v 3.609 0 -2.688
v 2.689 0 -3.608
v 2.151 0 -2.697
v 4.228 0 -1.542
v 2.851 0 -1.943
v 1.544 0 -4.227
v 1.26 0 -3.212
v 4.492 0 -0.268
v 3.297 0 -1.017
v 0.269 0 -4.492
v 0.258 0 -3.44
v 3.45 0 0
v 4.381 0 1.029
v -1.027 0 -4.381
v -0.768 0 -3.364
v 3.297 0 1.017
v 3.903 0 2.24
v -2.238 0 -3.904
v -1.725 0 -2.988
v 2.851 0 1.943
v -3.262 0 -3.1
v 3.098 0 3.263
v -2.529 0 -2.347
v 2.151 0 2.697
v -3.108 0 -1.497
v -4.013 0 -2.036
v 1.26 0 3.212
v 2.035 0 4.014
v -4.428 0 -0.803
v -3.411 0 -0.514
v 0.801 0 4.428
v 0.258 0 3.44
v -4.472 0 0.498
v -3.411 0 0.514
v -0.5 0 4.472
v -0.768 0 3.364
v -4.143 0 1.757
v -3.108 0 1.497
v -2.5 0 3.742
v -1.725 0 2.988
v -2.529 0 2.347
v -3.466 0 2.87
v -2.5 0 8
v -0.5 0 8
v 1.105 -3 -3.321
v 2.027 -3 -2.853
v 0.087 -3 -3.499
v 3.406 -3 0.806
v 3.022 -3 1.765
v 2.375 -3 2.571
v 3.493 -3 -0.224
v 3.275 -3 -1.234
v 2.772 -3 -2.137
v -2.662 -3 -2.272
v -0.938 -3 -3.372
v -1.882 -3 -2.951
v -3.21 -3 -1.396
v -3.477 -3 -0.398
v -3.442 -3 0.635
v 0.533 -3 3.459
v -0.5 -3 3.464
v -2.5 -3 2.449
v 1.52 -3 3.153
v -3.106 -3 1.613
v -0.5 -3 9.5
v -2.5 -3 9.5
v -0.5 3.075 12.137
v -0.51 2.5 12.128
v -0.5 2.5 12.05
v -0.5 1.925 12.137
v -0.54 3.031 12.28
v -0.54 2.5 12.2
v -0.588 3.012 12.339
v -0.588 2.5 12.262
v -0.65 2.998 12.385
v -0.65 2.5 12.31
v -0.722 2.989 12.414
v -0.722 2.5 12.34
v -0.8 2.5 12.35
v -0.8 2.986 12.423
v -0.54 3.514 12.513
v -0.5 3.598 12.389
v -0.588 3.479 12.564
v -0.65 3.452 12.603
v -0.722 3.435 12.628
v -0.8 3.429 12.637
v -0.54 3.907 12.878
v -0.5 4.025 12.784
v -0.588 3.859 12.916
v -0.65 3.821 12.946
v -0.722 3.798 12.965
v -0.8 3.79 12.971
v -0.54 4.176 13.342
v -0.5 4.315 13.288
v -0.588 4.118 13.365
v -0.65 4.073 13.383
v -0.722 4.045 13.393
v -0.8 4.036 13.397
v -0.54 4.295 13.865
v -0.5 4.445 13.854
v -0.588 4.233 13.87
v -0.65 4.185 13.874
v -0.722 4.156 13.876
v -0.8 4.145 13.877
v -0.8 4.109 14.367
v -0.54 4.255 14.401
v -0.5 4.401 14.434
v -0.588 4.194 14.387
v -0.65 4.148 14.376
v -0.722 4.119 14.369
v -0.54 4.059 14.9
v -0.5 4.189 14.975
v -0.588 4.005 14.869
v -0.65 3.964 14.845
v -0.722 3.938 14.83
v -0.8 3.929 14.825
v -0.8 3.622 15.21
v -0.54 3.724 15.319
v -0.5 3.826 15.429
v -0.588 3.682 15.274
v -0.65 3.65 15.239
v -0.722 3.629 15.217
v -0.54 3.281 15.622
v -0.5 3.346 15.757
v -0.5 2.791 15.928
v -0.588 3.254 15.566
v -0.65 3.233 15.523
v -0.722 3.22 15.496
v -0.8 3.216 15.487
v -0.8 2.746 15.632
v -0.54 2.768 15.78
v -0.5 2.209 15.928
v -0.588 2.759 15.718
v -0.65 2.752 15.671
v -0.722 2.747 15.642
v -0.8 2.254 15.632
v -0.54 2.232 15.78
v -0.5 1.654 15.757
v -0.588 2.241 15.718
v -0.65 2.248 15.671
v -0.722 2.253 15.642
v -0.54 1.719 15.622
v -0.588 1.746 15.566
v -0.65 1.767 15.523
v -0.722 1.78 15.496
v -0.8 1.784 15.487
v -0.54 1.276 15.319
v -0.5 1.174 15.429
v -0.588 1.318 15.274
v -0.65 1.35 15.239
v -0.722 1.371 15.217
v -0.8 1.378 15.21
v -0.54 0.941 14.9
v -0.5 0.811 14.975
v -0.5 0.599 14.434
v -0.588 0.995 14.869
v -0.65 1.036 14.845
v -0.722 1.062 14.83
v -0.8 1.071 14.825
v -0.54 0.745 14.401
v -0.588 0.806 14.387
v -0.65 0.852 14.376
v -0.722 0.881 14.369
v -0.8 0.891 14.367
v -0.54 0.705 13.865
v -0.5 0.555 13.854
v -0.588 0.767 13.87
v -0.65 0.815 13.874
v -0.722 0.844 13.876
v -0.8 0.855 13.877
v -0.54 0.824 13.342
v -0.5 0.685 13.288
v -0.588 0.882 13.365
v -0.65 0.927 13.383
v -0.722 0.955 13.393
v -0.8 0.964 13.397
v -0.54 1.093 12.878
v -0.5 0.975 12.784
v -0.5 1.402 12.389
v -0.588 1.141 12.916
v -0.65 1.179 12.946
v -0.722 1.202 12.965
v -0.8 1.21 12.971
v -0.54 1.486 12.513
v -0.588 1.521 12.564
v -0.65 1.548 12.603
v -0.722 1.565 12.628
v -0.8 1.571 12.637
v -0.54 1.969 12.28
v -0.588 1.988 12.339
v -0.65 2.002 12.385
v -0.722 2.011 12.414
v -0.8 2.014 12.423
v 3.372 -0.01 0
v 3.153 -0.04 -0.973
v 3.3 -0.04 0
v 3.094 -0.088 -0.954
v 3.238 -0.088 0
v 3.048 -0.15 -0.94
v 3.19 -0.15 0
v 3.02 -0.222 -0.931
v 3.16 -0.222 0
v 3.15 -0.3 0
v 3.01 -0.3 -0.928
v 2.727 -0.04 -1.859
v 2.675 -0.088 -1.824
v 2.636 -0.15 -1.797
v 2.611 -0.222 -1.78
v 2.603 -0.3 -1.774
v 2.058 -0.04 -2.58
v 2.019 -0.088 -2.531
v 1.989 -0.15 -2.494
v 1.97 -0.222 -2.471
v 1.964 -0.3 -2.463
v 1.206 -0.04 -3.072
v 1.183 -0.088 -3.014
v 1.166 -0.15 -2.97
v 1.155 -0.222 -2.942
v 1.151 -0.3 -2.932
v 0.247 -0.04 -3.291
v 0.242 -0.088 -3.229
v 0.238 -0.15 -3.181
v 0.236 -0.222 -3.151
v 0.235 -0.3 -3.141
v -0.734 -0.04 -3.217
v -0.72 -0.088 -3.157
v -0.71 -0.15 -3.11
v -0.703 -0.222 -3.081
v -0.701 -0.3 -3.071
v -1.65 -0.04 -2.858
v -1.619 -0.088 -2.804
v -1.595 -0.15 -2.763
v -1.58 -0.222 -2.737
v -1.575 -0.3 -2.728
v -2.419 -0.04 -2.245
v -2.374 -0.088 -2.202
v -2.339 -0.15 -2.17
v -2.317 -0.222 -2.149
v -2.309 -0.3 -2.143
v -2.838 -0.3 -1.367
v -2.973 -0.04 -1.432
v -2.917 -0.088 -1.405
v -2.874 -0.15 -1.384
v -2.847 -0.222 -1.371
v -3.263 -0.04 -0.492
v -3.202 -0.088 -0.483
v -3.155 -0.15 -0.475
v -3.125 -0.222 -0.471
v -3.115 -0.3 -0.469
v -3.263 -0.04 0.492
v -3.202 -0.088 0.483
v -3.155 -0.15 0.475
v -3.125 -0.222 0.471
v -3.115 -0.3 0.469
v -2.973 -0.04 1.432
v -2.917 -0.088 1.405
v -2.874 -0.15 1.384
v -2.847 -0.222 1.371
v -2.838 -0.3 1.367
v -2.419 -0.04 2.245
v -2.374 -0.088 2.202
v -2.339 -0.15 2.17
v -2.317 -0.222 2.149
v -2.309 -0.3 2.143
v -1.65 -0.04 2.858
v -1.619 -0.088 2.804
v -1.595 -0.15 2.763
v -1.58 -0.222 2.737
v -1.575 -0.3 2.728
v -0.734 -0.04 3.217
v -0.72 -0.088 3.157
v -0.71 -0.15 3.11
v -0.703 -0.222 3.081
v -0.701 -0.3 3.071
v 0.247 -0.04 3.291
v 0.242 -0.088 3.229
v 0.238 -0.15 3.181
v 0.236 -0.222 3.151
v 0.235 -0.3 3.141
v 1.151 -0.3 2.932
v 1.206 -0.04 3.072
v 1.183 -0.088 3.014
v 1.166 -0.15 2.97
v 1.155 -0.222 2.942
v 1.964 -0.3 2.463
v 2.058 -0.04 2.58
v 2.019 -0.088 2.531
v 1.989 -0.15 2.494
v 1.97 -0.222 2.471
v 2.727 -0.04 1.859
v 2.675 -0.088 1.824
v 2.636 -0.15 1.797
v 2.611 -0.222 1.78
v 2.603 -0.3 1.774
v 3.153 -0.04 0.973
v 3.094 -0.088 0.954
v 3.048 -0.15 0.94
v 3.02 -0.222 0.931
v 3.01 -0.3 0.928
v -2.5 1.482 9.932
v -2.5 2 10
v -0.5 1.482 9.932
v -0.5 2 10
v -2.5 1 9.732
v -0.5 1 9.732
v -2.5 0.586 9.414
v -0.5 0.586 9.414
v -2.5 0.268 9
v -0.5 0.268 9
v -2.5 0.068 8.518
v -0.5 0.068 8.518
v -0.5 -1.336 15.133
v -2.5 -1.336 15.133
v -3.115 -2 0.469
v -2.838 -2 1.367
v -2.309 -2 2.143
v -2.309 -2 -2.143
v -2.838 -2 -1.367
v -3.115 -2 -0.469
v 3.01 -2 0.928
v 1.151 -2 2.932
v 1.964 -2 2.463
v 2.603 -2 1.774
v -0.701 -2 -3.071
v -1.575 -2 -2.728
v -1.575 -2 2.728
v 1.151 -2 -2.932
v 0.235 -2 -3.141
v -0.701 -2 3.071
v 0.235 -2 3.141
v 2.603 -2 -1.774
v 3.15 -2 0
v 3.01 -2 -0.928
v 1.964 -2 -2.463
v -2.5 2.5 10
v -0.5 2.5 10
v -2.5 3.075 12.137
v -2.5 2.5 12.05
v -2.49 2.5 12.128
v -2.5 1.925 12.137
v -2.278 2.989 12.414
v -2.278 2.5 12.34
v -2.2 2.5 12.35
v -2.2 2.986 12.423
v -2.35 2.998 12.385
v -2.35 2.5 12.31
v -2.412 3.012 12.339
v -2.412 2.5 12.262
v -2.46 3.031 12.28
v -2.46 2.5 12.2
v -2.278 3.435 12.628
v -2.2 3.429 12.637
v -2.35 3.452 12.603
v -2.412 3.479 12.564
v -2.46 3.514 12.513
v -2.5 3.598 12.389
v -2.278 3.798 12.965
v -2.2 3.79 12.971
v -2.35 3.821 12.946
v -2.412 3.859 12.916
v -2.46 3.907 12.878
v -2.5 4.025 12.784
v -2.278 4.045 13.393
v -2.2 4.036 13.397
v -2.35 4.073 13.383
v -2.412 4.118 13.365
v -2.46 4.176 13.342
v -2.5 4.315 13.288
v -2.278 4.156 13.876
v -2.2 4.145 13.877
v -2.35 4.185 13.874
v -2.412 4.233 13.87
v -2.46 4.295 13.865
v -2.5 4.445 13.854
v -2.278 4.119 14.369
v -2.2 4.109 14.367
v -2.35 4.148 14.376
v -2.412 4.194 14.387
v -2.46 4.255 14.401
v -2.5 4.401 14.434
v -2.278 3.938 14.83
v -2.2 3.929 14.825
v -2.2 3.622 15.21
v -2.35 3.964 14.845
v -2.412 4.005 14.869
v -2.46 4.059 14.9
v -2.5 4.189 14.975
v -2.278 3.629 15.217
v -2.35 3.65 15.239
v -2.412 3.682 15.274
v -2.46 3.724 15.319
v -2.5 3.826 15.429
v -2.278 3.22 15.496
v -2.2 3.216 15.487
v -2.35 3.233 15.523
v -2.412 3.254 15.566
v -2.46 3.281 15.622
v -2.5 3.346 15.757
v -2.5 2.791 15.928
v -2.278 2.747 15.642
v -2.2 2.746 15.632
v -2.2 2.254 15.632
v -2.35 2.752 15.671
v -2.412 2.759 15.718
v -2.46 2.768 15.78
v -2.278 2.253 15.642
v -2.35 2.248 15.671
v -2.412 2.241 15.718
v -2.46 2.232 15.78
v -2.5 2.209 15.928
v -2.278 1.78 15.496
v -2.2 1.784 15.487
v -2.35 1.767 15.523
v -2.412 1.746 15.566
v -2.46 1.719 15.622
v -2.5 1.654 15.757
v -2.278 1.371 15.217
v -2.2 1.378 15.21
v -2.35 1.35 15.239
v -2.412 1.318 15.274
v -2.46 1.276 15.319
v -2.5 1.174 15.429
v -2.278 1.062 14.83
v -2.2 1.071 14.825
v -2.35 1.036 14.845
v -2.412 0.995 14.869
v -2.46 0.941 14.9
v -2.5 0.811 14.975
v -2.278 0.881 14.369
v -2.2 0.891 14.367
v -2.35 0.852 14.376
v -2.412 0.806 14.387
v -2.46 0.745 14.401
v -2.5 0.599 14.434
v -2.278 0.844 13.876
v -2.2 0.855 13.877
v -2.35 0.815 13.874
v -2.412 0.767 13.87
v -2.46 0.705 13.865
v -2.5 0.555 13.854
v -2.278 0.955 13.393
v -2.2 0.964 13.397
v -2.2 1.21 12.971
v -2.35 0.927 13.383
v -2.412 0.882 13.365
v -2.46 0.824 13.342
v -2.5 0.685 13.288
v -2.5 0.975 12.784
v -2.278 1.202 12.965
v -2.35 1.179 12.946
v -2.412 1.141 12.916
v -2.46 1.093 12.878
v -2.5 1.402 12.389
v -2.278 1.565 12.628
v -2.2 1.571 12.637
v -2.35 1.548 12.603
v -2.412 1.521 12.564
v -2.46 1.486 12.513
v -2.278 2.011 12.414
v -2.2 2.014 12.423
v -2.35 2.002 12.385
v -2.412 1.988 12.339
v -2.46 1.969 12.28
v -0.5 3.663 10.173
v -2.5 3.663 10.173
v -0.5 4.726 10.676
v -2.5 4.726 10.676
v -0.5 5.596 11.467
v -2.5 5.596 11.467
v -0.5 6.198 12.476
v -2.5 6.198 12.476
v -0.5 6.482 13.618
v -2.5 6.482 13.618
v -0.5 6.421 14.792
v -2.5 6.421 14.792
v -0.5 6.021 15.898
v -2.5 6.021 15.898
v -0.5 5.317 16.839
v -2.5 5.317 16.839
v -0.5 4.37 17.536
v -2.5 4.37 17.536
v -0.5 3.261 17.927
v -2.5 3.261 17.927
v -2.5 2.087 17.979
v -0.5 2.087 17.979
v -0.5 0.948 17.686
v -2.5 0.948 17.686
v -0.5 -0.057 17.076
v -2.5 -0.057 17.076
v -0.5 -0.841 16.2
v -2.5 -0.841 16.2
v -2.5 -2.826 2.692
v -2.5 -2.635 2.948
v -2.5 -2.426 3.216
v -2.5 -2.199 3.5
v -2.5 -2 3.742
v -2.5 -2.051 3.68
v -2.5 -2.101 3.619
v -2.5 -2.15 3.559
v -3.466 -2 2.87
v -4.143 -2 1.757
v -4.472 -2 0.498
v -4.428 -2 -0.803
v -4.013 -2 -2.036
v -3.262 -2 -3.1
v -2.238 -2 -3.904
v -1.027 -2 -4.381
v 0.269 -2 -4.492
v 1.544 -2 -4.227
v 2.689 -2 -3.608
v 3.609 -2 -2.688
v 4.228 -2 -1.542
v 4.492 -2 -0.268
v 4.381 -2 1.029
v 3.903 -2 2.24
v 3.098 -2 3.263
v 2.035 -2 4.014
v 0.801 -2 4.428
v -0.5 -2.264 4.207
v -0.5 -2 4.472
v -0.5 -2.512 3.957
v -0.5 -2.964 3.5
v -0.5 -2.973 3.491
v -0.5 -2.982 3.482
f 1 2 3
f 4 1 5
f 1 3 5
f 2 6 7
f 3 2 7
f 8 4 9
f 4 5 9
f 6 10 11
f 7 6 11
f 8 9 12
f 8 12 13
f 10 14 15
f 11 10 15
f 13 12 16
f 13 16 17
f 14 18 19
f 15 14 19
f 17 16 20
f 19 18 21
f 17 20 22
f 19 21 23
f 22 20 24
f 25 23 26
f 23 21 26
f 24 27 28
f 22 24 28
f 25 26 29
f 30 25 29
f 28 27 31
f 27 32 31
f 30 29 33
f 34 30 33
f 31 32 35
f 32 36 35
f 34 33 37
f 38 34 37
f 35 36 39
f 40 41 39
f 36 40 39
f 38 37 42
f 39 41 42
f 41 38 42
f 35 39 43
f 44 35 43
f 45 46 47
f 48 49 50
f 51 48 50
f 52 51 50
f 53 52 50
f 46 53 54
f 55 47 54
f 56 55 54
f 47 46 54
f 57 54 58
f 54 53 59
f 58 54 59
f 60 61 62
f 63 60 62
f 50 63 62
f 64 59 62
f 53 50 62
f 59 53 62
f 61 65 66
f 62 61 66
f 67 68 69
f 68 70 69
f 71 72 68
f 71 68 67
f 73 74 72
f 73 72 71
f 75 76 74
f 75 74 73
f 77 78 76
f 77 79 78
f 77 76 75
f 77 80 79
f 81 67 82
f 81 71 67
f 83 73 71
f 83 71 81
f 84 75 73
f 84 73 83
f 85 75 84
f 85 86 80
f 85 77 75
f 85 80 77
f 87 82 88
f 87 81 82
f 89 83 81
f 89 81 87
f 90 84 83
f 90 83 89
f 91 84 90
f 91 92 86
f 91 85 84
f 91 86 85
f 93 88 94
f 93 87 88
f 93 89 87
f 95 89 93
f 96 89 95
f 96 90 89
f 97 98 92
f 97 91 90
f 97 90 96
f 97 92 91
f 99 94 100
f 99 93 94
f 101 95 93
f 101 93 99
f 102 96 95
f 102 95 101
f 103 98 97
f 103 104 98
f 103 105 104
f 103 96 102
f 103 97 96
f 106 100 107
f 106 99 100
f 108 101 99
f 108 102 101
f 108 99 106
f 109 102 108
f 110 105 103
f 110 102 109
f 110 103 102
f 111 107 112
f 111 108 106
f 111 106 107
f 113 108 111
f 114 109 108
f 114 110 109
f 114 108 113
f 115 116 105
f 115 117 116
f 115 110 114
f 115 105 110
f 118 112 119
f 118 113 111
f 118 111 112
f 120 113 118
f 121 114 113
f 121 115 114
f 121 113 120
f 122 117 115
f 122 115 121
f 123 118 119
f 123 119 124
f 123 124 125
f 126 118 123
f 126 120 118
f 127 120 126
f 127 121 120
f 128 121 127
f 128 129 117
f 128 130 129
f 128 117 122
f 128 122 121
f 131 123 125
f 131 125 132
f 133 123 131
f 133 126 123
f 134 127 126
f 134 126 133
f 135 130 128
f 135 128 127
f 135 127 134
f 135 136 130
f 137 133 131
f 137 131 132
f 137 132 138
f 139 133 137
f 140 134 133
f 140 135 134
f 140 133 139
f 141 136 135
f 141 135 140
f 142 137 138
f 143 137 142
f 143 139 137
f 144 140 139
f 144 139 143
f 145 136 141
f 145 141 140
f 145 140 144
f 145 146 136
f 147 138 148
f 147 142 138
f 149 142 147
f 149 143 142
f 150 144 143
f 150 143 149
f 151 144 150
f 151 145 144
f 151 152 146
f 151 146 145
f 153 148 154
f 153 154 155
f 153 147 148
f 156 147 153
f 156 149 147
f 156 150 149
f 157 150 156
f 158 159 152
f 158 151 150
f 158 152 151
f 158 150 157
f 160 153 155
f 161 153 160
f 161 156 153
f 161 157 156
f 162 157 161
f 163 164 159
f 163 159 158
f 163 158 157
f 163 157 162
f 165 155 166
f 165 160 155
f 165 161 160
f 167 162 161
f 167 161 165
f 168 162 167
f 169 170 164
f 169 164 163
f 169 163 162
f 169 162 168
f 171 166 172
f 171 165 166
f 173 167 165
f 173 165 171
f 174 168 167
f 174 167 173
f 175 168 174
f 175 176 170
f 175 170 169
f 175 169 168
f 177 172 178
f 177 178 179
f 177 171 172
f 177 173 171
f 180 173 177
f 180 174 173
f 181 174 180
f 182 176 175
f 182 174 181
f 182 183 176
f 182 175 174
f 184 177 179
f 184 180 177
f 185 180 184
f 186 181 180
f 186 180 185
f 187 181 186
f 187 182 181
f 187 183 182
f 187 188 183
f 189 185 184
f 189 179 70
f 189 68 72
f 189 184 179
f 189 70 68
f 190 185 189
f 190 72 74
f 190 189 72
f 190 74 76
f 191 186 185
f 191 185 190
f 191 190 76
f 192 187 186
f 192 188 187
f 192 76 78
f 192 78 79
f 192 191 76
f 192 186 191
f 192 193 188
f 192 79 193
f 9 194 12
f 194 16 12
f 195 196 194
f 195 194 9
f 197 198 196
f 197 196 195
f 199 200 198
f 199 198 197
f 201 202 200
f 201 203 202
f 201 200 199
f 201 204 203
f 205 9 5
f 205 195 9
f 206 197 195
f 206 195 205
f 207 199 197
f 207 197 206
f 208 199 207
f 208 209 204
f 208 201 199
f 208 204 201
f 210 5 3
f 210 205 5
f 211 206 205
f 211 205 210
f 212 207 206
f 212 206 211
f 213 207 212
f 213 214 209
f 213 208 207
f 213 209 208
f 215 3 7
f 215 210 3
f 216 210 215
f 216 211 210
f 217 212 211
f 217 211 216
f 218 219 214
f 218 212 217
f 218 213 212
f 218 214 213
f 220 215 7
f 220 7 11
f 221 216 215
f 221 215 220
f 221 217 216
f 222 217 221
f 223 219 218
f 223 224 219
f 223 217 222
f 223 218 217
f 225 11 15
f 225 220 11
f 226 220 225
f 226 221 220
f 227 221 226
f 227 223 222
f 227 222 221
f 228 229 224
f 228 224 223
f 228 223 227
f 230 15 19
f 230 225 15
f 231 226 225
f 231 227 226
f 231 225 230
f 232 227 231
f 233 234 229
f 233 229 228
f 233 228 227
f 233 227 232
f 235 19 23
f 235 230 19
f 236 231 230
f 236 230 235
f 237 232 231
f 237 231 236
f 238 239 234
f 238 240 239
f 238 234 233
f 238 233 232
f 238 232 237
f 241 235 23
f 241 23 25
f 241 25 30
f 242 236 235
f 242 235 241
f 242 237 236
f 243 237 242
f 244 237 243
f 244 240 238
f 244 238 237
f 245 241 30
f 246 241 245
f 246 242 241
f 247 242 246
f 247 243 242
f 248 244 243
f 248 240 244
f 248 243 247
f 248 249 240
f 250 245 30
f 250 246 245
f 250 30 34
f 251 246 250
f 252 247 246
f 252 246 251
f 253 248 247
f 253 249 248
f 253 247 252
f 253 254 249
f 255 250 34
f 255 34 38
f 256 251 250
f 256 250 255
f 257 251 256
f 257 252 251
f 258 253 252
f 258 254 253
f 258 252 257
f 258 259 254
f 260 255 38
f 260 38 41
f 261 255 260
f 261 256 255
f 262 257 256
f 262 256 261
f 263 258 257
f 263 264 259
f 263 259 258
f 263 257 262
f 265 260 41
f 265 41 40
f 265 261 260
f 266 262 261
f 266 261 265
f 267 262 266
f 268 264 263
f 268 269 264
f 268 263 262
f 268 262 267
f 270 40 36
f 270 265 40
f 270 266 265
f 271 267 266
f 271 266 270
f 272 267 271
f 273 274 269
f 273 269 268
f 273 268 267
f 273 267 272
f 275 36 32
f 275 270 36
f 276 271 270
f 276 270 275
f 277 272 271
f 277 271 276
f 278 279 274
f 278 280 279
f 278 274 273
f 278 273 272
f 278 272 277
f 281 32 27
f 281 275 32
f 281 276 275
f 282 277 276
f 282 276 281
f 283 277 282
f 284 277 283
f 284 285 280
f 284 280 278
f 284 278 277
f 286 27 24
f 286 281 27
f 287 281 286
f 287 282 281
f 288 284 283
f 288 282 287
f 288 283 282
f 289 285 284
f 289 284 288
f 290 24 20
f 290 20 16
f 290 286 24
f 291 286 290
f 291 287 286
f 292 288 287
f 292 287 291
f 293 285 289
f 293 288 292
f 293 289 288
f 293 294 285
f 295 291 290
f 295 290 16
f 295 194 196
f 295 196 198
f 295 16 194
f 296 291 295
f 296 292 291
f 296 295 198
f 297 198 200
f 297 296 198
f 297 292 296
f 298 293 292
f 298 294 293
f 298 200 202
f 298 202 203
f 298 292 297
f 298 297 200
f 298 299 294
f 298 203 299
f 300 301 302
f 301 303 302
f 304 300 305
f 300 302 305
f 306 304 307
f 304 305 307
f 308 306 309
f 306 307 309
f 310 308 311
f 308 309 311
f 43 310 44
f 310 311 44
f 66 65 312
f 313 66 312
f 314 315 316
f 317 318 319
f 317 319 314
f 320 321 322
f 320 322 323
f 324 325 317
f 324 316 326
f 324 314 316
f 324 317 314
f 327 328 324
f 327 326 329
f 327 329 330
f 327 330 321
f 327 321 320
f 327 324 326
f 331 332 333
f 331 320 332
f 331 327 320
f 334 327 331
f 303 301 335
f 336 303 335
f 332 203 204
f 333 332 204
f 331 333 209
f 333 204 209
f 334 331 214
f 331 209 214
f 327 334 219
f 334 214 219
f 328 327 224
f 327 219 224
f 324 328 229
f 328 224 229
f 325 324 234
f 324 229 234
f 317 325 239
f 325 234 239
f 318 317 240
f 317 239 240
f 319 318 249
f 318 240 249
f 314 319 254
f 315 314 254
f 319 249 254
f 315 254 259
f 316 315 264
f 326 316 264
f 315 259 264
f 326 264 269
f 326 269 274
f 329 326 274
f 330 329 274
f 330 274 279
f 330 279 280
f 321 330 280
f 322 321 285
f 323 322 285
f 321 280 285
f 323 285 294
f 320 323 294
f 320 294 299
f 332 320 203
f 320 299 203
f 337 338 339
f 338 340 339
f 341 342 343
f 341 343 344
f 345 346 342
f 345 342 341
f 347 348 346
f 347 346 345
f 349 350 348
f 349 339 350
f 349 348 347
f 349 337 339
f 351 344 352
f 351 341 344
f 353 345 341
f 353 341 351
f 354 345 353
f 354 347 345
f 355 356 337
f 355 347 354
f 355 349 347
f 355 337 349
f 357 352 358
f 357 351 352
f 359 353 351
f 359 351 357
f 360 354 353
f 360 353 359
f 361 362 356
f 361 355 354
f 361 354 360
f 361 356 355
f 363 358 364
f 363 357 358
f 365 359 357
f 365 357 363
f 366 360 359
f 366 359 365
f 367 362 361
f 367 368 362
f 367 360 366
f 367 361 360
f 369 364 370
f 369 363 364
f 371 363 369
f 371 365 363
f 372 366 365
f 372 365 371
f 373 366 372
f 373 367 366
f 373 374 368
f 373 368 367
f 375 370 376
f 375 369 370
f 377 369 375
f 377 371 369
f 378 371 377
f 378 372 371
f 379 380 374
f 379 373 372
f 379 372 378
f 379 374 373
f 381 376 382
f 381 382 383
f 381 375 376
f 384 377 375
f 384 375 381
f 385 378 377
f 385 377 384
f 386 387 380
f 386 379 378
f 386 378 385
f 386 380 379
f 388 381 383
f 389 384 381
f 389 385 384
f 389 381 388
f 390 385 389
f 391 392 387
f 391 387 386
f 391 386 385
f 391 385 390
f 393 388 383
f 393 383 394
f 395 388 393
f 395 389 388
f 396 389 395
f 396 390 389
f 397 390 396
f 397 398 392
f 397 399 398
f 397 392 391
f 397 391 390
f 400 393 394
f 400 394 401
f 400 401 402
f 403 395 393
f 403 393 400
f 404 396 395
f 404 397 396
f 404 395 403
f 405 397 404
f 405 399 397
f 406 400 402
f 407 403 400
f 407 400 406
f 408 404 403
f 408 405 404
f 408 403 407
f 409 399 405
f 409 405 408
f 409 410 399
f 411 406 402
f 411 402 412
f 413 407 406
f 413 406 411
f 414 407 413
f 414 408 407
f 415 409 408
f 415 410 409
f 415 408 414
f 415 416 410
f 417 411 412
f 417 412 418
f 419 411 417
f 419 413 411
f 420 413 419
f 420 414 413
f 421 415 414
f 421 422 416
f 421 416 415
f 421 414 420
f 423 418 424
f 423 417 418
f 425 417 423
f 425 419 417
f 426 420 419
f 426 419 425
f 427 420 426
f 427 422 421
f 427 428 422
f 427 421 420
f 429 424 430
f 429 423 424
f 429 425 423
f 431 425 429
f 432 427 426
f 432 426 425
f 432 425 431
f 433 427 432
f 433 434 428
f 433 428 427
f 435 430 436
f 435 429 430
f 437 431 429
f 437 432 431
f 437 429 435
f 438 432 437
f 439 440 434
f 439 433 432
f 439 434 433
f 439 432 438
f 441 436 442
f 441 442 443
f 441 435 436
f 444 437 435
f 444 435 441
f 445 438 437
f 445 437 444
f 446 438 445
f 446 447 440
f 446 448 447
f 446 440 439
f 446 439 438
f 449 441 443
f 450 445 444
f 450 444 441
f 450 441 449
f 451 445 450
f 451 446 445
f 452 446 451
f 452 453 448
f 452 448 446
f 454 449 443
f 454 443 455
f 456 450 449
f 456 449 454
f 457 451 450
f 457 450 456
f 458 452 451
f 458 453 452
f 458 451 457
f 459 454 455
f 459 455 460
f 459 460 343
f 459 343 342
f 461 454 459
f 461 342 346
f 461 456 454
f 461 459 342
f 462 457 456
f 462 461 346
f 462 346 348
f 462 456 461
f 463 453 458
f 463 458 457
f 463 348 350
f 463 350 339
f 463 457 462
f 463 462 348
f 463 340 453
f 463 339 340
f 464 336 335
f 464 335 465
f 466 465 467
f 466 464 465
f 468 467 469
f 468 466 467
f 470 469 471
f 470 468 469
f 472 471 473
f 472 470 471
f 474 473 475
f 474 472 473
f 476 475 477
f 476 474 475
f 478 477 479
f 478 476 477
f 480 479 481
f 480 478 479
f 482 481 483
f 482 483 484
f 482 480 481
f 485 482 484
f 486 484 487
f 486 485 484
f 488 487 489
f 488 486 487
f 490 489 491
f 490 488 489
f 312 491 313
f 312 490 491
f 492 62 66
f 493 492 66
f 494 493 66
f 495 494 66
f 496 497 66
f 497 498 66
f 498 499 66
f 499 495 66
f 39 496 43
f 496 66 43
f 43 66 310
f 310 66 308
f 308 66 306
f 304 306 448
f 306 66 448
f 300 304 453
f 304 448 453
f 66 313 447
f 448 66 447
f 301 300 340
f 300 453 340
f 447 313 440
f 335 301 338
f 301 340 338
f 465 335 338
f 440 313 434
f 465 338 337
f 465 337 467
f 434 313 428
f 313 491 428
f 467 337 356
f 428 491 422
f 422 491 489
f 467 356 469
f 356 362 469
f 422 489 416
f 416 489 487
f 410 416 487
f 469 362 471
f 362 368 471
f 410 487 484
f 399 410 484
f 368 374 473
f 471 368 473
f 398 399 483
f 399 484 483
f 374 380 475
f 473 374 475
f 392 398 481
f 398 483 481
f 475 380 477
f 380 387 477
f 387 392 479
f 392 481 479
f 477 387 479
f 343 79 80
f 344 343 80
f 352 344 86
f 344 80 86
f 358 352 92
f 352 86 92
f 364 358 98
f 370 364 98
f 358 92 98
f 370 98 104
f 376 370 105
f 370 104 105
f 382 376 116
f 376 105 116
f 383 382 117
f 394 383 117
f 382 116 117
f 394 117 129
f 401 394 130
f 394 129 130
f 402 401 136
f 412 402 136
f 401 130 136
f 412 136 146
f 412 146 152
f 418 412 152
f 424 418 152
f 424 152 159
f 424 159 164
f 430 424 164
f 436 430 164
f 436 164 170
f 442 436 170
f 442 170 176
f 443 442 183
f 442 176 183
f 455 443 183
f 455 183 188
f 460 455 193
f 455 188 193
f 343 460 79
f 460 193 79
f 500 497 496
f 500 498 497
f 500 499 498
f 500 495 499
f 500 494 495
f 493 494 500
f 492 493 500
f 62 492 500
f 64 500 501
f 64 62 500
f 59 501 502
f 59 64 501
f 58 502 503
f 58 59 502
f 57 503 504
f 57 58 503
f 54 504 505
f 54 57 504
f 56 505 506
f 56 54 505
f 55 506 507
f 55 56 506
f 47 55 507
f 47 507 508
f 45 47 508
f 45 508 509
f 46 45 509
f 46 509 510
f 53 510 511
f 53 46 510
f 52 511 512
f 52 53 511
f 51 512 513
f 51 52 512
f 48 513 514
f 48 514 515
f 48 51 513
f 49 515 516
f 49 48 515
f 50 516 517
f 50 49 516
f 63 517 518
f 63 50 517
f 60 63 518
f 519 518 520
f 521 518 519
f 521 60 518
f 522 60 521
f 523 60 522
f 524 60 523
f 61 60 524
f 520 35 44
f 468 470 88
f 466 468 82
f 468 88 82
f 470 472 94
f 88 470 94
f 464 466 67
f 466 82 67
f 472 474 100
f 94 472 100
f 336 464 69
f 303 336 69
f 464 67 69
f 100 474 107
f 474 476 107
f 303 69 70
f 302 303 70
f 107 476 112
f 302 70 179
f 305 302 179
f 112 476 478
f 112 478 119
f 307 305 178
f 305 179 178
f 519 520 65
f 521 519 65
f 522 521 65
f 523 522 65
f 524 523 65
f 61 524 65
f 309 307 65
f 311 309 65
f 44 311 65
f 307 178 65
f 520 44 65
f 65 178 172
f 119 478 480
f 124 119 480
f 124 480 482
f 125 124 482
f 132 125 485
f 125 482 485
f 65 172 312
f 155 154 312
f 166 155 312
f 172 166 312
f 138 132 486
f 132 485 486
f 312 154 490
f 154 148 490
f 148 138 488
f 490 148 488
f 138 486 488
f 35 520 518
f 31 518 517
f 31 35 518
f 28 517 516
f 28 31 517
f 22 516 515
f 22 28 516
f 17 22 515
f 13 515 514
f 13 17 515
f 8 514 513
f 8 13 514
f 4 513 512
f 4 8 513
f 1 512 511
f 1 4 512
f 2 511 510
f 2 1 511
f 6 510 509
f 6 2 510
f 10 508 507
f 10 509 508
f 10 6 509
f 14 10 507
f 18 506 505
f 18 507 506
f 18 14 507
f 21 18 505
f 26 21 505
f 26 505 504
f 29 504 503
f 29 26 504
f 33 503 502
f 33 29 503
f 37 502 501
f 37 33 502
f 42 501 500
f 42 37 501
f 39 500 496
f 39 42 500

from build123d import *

# Parameters (mm, degrees)
SKETCH_6_R          = 4.5
EXTRUDE_4_DEPTH     = 3
SKETCH_7_R          = 3.15
CUT_EXTRUDE_4_DEPTH = 2
SKETCH_8_R          = 4
EXTRUDE_5_DEPTH     = 2
EXTRUDE_7_DEPTH     = 2
EXTRUDE_8_REACH     = 10
SKETCH_11_R         = 1.65
CUT_EXTRUDE_6_DEPTH = 2
CUT_EXTRUDE_7_REACH = 9
FILLET_4_R          = 2
FILLET_1_R          = 0.3
FILLET_2_R          = 0.3
FILLET_3_R          = 0.3


with BuildPart() as part:
    # 草图6 → 凸台-拉伸4 (new body)
    with BuildSketch(Plane(origin=(0, 0, 0), x_dir=(1, 0, 0), z_dir=(0, 1, 0))):
        Circle(SKETCH_6_R)
    extrude(amount=-EXTRUDE_4_DEPTH)

    # 草图7 → 切除-拉伸4 (cut)
    with BuildSketch(Plane(origin=(0, 0, 0), x_dir=(1, 0, 0), z_dir=(0, 1, 0))):
        Circle(SKETCH_7_R)
    extrude(amount=-CUT_EXTRUDE_4_DEPTH, mode=Mode.SUBTRACT)

    # 草图15 → 切除-旋转2 (revolve, cut)
    with BuildSketch(Plane(origin=(0, 0, 0), x_dir=(0, 0, -1), z_dir=(1, 0, 0))):
        Polygon((4.5, -3), (4.5, -2), (3.5, -3), align=None)
    revolve(axis=Axis((0, 0, 0), (0, -1, 0)), mode=Mode.SUBTRACT)



with BuildPart() as body_2:
    # 草图8 → 凸台-拉伸5 (new body)
    with BuildSketch(Plane(origin=(-0.5, 0, 0), x_dir=(0, 0, -1), z_dir=(1, 0, 0))):
        with Locations((-14, 2.5)):
            Circle(SKETCH_8_R)
    extrude(amount=-EXTRUDE_5_DEPTH)


with BuildPart() as part_1:
    add(part.part)

    add(body_2.part)  # 凸台-拉伸7 merges body 2
    # 草图9 → 凸台-拉伸7 (add)
    with BuildSketch(Plane(origin=(-0.5, 0, 0), x_dir=(0, 0, -1), z_dir=(1, 0, 0))):
        Polygon((-9.5, -3), (-15.133083988, -1.336159626), (-10.74928321, 0.169154585), (-10, 2.5), (-6.344746865, 2.002637663), (-3.5, 0), (-3.5, -3), (-3.52896076, -3), align=None)
    extrude(amount=-EXTRUDE_7_DEPTH)

    # 草图16 → 凸台-拉伸8 (add, up to next)
    with BuildSketch(Plane(origin=(0, 0, 3.5), x_dir=(-1, 0, 0), z_dir=(0, 0, -1)), mode=Mode.PRIVATE) as extrude_8_sk1:
        Polygon((2.5, -3), (2.5, -2.198837366), (0.5, -2.955716811), (0.5, -3), align=None)
    extrude_8_tool1 = extrude(extrude_8_sk1.sketch, amount=EXTRUDE_8_REACH, mode=Mode.PRIVATE) - part_1.part
    add(extrude_8_tool1.solids().sort_by_distance((-1.798414, -2.732173, 3.5))[0])

    # 草图11 → 切除-拉伸6 (cut)
    with BuildSketch(Plane(origin=(-0.5, 0, 0), x_dir=(0, 0, -1), z_dir=(1, 0, 0))):
        with Locations((-14, 2.5)):
            Circle(SKETCH_11_R)
    extrude(amount=-CUT_EXTRUDE_6_DEPTH, mode=Mode.SUBTRACT)

    # 草图12 → 切除-拉伸7 (cut, up to next)
    with BuildSketch(Plane.ZY.offset(2.5), mode=Mode.PRIVATE) as cut_extrude_7_sk1:
        Polygon((3.5, 0), (3.741657387, 0), (10, 0), (10, 2.5), (6.344746865, 2.002637663), align=None)
    cut_extrude_7_tool1 = extrude(cut_extrude_7_sk1.sketch, amount=-CUT_EXTRUDE_7_REACH, mode=Mode.PRIVATE) & part_1.part
    add(cut_extrude_7_tool1.solids().sort_by_distance((-2.5, 1.011261, 7.508576))[0], mode=Mode.SUBTRACT)

    # 圆角4
    fillet_4_edges = [part_1.edges().sort_by_distance(p)[0] for p in [
        (-1.5, 0, 10),
    ]]
    fillet(fillet_4_edges, radius=FILLET_4_R)

    # 圆角1
    fillet_1_edges = [part_1.edges().sort_by_distance(p)[0] for p in [
        (-3.15, 0, 0),
    ]]
    fillet(fillet_1_edges, radius=FILLET_1_R)

    # 圆角2
    fillet_2_edges = [part_1.edges().sort_by_distance(p)[0] for p in [
        (-0.5, 2.5, 15.65),
    ]]
    fillet(fillet_2_edges, radius=FILLET_2_R)

    # 圆角3
    fillet_3_edges = [part_1.edges().sort_by_distance(p)[0] for p in [
        (-2.5, 2.5, 15.65),
    ]]
    fillet(fillet_3_edges, radius=FILLET_3_R)


solid = part_1.part
